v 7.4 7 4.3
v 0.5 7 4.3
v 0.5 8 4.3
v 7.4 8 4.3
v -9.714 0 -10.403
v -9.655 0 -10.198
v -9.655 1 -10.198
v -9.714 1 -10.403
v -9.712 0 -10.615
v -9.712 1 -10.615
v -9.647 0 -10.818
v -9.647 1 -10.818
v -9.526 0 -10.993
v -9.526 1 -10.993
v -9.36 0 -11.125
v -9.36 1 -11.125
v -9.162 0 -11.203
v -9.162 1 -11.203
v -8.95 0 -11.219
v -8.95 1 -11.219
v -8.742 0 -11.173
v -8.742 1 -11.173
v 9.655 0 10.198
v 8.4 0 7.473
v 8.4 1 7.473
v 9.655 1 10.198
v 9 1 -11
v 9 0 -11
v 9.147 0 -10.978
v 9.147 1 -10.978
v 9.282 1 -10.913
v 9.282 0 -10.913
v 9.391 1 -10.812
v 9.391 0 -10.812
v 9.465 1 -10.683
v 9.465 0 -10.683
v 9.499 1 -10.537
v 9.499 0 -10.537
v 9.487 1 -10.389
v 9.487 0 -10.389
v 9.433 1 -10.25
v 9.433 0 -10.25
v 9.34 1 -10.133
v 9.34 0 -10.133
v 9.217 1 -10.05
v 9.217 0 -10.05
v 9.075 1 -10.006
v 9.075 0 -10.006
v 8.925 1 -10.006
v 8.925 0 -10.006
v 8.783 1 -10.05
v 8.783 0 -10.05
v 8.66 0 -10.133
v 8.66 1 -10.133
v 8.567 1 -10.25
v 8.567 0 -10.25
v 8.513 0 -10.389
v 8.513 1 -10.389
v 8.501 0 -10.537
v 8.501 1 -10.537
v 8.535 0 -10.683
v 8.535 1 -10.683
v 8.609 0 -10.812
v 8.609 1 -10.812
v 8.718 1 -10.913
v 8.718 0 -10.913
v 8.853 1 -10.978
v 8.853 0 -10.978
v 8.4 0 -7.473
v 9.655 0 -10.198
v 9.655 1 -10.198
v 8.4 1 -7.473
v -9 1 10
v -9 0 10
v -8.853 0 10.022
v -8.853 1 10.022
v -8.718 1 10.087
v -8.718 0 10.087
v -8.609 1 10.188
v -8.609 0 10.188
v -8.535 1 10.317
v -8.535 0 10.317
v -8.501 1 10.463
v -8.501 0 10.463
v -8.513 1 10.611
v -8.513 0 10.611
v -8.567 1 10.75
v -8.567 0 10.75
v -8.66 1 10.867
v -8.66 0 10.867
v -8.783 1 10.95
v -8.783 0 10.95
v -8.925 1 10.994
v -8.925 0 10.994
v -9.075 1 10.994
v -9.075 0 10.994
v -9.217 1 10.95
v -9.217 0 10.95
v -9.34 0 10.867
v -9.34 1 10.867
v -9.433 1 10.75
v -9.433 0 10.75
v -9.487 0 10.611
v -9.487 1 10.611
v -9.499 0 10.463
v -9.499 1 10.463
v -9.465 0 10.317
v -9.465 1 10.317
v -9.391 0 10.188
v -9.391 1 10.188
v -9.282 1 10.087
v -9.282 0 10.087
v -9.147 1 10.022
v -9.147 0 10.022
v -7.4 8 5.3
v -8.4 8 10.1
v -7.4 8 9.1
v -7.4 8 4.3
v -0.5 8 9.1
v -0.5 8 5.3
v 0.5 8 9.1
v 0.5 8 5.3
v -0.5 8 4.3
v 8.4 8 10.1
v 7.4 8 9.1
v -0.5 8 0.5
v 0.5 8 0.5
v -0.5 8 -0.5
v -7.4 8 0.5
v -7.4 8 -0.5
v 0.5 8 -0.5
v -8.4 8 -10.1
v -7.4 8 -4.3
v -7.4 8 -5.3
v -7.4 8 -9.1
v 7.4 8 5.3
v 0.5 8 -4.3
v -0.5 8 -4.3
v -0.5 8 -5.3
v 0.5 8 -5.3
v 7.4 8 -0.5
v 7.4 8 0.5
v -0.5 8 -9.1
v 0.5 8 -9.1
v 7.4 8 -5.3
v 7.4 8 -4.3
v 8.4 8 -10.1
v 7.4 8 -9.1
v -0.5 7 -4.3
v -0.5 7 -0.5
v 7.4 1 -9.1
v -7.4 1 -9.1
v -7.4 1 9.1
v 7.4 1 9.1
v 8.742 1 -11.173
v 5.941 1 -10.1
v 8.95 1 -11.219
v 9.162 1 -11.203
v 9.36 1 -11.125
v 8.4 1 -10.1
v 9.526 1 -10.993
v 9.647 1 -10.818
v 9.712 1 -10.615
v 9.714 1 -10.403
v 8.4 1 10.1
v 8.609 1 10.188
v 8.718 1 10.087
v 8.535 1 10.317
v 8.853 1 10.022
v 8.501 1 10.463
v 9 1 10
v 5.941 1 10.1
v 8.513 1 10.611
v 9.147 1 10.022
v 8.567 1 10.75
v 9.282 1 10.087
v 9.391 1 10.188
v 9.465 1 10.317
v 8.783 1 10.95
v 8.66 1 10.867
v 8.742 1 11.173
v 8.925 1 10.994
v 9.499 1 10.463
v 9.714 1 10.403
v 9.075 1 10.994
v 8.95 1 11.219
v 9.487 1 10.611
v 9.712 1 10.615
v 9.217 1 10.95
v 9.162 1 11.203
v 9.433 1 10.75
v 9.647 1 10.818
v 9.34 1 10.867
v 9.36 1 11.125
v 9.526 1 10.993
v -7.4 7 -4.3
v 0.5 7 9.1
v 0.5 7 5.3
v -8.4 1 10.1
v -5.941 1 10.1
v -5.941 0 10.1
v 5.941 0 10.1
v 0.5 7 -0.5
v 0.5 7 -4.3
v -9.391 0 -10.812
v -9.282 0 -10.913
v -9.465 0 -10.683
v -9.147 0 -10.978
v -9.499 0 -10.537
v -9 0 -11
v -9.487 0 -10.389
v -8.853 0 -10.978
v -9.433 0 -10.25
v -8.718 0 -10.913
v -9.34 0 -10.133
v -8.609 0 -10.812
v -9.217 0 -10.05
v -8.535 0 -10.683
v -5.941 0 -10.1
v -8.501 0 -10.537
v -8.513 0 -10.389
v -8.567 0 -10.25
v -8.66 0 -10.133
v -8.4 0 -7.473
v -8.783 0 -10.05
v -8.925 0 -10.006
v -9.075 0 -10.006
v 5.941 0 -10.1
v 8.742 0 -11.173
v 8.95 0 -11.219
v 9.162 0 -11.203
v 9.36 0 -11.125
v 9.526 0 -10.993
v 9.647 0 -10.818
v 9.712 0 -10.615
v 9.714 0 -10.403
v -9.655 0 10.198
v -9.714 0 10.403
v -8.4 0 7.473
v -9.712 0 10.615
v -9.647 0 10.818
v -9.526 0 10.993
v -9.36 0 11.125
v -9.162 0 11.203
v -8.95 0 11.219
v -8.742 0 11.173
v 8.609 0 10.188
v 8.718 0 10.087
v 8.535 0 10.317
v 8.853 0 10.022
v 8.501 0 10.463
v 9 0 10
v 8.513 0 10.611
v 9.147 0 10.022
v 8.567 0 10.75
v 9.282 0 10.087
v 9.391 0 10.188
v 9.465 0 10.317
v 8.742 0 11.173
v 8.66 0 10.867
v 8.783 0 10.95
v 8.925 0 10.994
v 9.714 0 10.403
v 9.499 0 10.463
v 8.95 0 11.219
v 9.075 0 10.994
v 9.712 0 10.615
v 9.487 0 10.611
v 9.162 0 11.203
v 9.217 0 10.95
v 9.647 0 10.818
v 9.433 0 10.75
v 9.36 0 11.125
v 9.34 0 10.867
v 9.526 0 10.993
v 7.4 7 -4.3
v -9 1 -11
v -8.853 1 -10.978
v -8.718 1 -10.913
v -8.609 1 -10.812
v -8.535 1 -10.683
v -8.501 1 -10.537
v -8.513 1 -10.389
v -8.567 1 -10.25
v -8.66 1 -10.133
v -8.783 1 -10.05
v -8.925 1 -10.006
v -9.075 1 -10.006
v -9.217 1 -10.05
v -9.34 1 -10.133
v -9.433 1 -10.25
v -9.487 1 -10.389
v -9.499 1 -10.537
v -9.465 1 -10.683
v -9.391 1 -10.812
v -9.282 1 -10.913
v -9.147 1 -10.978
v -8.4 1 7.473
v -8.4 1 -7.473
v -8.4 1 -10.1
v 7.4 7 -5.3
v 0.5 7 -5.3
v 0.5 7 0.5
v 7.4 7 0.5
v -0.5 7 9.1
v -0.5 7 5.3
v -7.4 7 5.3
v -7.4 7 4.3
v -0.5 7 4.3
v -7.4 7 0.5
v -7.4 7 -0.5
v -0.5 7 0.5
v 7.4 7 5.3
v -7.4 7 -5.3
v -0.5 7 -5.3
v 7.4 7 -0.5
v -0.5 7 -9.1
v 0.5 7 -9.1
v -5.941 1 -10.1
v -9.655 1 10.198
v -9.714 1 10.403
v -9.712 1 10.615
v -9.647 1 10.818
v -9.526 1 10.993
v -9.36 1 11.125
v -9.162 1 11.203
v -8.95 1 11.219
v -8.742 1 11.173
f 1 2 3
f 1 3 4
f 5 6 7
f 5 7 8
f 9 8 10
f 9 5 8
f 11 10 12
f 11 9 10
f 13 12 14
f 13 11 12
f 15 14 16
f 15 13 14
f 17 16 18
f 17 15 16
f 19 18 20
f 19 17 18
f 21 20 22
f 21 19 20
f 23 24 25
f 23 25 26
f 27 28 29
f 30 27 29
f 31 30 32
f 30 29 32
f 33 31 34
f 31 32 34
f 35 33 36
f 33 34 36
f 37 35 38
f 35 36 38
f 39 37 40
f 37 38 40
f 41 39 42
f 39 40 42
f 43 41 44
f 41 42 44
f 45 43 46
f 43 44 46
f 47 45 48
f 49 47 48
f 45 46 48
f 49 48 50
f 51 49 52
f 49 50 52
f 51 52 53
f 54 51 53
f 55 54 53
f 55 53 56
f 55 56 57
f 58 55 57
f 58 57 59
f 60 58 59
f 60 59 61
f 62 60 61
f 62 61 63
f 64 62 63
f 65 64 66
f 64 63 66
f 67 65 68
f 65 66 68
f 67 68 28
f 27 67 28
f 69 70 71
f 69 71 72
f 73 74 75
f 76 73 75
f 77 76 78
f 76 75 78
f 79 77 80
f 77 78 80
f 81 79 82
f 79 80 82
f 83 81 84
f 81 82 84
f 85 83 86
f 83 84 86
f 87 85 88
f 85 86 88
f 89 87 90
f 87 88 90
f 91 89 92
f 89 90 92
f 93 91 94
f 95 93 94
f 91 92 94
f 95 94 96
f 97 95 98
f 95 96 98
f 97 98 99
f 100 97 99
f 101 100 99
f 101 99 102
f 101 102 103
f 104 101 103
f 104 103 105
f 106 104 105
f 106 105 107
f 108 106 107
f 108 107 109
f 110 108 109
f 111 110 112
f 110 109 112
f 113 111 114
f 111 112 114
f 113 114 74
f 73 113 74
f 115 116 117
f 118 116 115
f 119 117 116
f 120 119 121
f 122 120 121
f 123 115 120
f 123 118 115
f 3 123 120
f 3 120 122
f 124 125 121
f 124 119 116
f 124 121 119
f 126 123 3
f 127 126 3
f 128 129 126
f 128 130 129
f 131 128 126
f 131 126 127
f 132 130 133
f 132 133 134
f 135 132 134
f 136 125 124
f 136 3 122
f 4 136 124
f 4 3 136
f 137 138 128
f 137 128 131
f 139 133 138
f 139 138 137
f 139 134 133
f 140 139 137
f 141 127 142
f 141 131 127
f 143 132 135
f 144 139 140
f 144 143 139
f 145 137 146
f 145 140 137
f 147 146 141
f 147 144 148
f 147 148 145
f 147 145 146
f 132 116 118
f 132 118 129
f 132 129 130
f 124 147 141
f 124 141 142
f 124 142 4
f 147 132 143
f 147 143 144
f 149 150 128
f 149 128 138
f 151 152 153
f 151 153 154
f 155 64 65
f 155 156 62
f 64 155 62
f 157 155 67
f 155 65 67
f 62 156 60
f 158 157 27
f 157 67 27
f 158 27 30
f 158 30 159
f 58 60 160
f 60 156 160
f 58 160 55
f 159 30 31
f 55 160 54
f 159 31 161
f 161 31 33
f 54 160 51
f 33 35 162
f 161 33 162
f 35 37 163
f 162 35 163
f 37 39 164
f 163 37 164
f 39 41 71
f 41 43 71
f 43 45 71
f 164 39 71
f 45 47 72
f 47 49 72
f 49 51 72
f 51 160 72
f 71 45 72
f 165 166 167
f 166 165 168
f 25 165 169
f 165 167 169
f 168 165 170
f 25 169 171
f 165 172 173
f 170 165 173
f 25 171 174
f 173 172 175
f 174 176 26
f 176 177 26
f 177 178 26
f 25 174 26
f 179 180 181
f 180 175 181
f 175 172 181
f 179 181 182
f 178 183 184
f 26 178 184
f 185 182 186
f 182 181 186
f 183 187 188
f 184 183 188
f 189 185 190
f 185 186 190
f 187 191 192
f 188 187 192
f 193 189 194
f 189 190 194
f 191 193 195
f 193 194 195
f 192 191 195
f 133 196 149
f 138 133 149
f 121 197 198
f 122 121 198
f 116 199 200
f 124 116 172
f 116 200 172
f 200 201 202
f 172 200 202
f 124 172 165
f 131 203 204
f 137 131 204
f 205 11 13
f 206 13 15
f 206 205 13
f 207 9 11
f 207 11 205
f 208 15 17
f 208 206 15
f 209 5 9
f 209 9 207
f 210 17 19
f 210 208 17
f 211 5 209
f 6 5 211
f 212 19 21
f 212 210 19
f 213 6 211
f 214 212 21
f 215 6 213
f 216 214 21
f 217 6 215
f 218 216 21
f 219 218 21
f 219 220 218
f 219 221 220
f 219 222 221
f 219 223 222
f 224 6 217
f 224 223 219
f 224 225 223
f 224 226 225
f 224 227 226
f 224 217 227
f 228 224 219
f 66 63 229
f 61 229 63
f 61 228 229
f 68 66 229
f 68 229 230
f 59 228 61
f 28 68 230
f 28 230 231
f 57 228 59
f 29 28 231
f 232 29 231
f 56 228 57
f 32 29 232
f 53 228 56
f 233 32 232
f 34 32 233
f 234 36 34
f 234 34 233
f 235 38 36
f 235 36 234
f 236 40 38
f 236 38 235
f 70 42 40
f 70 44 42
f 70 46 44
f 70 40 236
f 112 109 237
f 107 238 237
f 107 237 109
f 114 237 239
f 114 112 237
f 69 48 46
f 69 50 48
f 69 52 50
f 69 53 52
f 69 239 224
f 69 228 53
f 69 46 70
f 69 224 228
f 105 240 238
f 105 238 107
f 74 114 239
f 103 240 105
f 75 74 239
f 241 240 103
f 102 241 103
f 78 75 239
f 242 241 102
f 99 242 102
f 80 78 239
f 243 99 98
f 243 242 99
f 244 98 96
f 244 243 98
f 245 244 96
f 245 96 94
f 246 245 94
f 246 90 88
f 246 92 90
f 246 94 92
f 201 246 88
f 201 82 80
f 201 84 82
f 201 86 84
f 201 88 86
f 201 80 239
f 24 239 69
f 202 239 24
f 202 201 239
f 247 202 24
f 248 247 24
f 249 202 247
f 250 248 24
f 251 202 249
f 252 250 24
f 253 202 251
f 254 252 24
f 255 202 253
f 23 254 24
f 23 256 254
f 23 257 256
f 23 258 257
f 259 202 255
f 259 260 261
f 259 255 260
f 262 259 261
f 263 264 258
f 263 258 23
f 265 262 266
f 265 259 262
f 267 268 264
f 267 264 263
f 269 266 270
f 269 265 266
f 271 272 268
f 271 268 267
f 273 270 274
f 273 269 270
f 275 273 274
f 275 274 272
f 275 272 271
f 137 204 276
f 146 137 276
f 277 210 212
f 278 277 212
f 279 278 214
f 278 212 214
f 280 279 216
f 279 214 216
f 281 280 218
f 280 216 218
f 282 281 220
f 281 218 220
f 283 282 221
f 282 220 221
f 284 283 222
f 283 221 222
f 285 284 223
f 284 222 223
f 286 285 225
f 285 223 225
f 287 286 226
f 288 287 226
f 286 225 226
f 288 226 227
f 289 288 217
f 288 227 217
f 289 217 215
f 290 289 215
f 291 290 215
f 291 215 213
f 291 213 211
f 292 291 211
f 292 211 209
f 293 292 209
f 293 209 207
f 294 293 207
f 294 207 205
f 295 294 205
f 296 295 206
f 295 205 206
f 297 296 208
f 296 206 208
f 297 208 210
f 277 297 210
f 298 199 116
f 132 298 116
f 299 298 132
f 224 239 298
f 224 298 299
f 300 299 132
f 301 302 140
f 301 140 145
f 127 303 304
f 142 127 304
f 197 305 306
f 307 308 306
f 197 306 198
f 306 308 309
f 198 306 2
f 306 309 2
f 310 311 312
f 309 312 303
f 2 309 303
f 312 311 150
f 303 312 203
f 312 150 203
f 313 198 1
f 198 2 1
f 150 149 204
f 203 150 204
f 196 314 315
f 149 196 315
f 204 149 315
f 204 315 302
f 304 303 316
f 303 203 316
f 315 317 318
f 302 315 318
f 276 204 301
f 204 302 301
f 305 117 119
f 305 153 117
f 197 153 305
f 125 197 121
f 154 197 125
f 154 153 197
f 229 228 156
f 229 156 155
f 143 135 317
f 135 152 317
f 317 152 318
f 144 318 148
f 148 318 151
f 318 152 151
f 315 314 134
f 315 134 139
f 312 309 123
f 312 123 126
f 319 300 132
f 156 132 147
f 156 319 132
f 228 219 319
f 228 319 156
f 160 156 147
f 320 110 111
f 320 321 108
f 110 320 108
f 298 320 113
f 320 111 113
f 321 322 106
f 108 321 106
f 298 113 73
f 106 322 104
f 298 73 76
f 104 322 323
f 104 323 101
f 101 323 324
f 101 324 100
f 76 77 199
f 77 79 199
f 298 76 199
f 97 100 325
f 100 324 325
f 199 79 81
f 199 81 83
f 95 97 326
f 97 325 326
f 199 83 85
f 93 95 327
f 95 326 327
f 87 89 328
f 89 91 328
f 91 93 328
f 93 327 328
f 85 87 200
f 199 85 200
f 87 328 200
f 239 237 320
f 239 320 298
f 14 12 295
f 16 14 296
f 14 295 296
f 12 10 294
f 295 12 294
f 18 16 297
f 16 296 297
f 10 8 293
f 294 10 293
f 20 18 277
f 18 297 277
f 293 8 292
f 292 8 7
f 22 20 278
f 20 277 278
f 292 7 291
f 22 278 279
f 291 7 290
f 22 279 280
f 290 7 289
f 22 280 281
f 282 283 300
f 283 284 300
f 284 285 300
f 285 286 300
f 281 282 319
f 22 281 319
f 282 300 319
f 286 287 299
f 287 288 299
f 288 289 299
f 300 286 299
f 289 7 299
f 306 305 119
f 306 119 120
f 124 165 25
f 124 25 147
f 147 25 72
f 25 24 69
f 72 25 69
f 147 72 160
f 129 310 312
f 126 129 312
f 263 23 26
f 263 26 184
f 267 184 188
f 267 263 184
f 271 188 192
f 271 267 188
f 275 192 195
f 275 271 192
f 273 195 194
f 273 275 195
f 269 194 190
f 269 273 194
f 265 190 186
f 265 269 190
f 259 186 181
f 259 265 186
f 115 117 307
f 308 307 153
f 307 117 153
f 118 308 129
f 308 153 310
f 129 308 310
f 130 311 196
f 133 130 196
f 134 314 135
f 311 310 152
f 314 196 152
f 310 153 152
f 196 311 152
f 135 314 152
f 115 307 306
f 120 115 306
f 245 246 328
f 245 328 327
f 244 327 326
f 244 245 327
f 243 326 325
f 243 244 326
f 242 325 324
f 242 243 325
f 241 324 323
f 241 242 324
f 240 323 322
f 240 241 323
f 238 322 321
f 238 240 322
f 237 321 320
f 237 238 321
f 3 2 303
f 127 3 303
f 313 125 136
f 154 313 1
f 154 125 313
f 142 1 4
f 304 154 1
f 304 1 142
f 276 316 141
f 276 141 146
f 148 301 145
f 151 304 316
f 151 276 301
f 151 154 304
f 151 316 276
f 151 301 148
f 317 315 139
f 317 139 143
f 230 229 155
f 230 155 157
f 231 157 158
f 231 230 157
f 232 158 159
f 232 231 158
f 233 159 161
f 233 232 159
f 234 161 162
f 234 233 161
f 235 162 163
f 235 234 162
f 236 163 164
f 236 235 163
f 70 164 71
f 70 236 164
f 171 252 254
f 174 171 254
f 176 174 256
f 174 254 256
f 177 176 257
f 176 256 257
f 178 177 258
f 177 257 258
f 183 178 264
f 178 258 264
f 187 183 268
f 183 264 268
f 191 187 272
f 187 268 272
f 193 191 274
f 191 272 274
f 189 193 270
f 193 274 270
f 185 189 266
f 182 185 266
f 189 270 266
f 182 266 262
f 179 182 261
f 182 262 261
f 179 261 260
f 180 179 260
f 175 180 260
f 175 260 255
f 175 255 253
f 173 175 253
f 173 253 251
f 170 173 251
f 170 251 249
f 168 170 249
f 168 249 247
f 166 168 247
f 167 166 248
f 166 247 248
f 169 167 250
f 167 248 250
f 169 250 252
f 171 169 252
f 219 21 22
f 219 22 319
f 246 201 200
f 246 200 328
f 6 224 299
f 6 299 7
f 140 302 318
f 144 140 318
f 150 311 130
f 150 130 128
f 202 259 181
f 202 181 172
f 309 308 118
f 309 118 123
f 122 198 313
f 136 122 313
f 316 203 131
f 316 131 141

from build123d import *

# Parameters (mm, degrees)
SKETCH1_W           = 16.8
SKETCH1_H           = 20.2
SKETCH1_W_2         = 6.9
SKETCH1_H_2         = 3.8
BOSS_EXTRUDE1_DEPTH = 1
SKETCH2_W           = 16.8
SKETCH2_H           = 20.2
SKETCH2_W_2         = 6.9
SKETCH2_H_2         = 3.8
BOSS_EXTRUDE2_DEPTH = 1
SKETCH4_W           = 16.8
SKETCH4_H           = 20.2
SKETCH4_W_2         = 14.8
SKETCH4_H_2         = 18.2
BOSS_EXTRUDE3_DEPTH = 6
SKETCH5_R           = 0.5
BOSS_EXTRUDE4_DEPTH = 1


with BuildPart() as part:
    # Sketch1 → Boss-Extrude1 (new body)
    # profile 1 of 9: a face of its own
    with BuildSketch(Plane(origin=(0, 0, 0), x_dir=(1, 0, 0), z_dir=(0, 1, 0))):
        Rectangle(SKETCH1_W, SKETCH1_H)
        with Locations((3.95, 7.2)):
            Rectangle(SKETCH1_W_2, SKETCH1_H_2, mode=Mode.SUBTRACT)
        with Locations((3.95, 2.4)):
            Rectangle(SKETCH1_W_2, SKETCH1_H_2, mode=Mode.SUBTRACT)
        with Locations((-3.95, -2.4)):
            Rectangle(SKETCH1_W_2, SKETCH1_H_2, mode=Mode.SUBTRACT)
        with Locations((-3.95, -7.2)):
            Rectangle(SKETCH1_W_2, SKETCH1_H_2, mode=Mode.SUBTRACT)
        with Locations((3.95, -7.2)):
            Rectangle(SKETCH1_W_2, SKETCH1_H_2, mode=Mode.SUBTRACT)
        with Locations((3.95, -2.4)):
            Rectangle(SKETCH1_W_2, SKETCH1_H_2, mode=Mode.SUBTRACT)
        with Locations((-3.95, 7.2)):
            Rectangle(SKETCH1_W_2, SKETCH1_H_2, mode=Mode.SUBTRACT)
        with Locations((-3.95, 2.4)):
            Rectangle(SKETCH1_W_2, SKETCH1_H_2, mode=Mode.SUBTRACT)
    # profile 2 of 9: a face of its own
    with BuildSketch(Plane(origin=(0, 0, 0), x_dir=(1, 0, 0), z_dir=(0, 1, 0))):
        with Locations((-3.95, 2.4)):
            Rectangle(SKETCH1_W_2, SKETCH1_H_2)
    # profile 3 of 9: a face of its own
    with BuildSketch(Plane(origin=(0, 0, 0), x_dir=(1, 0, 0), z_dir=(0, 1, 0))):
        with Locations((-3.95, 7.2)):
            Rectangle(SKETCH1_W_2, SKETCH1_H_2)
    # profile 4 of 9: a face of its own
    with BuildSketch(Plane(origin=(0, 0, 0), x_dir=(1, 0, 0), z_dir=(0, 1, 0))):
        with Locations((3.95, 7.2)):
            Rectangle(SKETCH1_W_2, SKETCH1_H_2)
    # profile 5 of 9: a face of its own
    with BuildSketch(Plane(origin=(0, 0, 0), x_dir=(1, 0, 0), z_dir=(0, 1, 0))):
        with Locations((3.95, 2.4)):
            Rectangle(SKETCH1_W_2, SKETCH1_H_2)
    # profile 6 of 9: a face of its own
    with BuildSketch(Plane(origin=(0, 0, 0), x_dir=(1, 0, 0), z_dir=(0, 1, 0))):
        with Locations((3.95, -2.4)):
            Rectangle(SKETCH1_W_2, SKETCH1_H_2)
    # profile 7 of 9: a face of its own
    with BuildSketch(Plane(origin=(0, 0, 0), x_dir=(1, 0, 0), z_dir=(0, 1, 0))):
        with Locations((-3.95, -2.4)):
            Rectangle(SKETCH1_W_2, SKETCH1_H_2)
    # profile 8 of 9: a face of its own
    with BuildSketch(Plane(origin=(0, 0, 0), x_dir=(1, 0, 0), z_dir=(0, 1, 0))):
        with Locations((-3.95, -7.2)):
            Rectangle(SKETCH1_W_2, SKETCH1_H_2)
    # profile 9 of 9: a face of its own
    with BuildSketch(Plane(origin=(0, 0, 0), x_dir=(1, 0, 0), z_dir=(0, 1, 0))):
        with Locations((3.95, -7.2)):
            Rectangle(SKETCH1_W_2, SKETCH1_H_2)
    extrude(amount=BOSS_EXTRUDE1_DEPTH)



with BuildPart() as body_2:
    # Sketch2 → Boss-Extrude2 (new body)
    with BuildSketch(Plane(origin=(0, 7, 0), x_dir=(1, 0, 0), z_dir=(0, 1, 0))):
        Rectangle(SKETCH2_W, SKETCH2_H)
        with Locations((-3.95, -7.2)):
            Rectangle(SKETCH2_W_2, SKETCH2_H_2, mode=Mode.SUBTRACT)
        with Locations((3.95, -7.2)):
            Rectangle(SKETCH2_W_2, SKETCH2_H_2, mode=Mode.SUBTRACT)
        with Locations((3.95, -2.4)):
            Rectangle(SKETCH2_W_2, SKETCH2_H_2, mode=Mode.SUBTRACT)
        with Locations((-3.95, -2.4)):
            Rectangle(SKETCH2_W_2, SKETCH2_H_2, mode=Mode.SUBTRACT)
        with Locations((-3.95, 2.4)):
            Rectangle(SKETCH2_W_2, SKETCH2_H_2, mode=Mode.SUBTRACT)
        with Locations((3.95, 2.4)):
            Rectangle(SKETCH2_W_2, SKETCH2_H_2, mode=Mode.SUBTRACT)
        with Locations((3.95, 7.2)):
            Rectangle(SKETCH2_W_2, SKETCH2_H_2, mode=Mode.SUBTRACT)
        with Locations((-3.95, 7.2)):
            Rectangle(SKETCH2_W_2, SKETCH2_H_2, mode=Mode.SUBTRACT)
    extrude(amount=BOSS_EXTRUDE2_DEPTH)


with BuildPart() as part_1:
    add(part.part)

    add(body_2.part)  # Boss-Extrude3 merges body 2
    # Sketch4 → Boss-Extrude3 (add)
    with BuildSketch(Plane(origin=(0, 1, 0), x_dir=(1, 0, 0), z_dir=(0, 1, 0))):
        Rectangle(SKETCH4_W, SKETCH4_H)
        Rectangle(SKETCH4_W_2, SKETCH4_H_2, mode=Mode.SUBTRACT)
    extrude(amount=BOSS_EXTRUDE3_DEPTH)

    # Sketch5 → Boss-Extrude4 (add)
    # profile 1 of 4: a face of its own
    with BuildSketch(Plane.XZ):
        with BuildLine():
            Line((8.4, 7.47345081), (9.654981825, 10.198339912))
            ThreePointArc((9.654981825, 10.198339912), (9.526374462, 10.99287922), (8.741993026, 11.173373894))
            Line((8.741993026, 11.173373894), (5.940588292, 10.1))
            Line((5.940588292, 10.1), (8.4, 10.1))
            Line((8.4, 10.1), (8.4, 7.47345081))
        make_face()
        with Locations(Location((9, 10.5, 0), (0, 0, 270))):
            Circle(SKETCH5_R, mode=Mode.SUBTRACT)
    # profile 2 of 4: a face of its own
    with BuildSketch(Plane.XZ):
        with BuildLine():
            Line((9.654981825, -10.198339912), (8.4, -7.47345081))
            Line((8.4, -7.47345081), (8.4, -10.1))
            Line((8.4, -10.1), (5.940588292, -10.1))
            Line((5.940588292, -10.1), (8.741993026, -11.173373894))
            ThreePointArc((8.741993026, -11.173373894), (9.526374462, -10.99287922), (9.654981825, -10.198339912))
        make_face()
        with Locations(Location((9, -10.5, 0), (0, 0, 270))):
            Circle(SKETCH5_R, mode=Mode.SUBTRACT)
    # profile 3 of 4: a face of its own
    with BuildSketch(Plane.XZ):
        with BuildLine():
            Line((-8.4, 10.1), (-5.940588292, 10.1))
            Line((-5.940588292, 10.1), (-8.741993026, 11.173373894))
            ThreePointArc((-8.741993026, 11.173373894), (-9.526374462, 10.99287922), (-9.654981825, 10.198339912))
            Line((-9.654981825, 10.198339912), (-8.4, 7.47345081))
            Line((-8.4, 7.47345081), (-8.4, 10.1))
        make_face()
        with Locations(Location((-9, 10.5, 0), (0, 0, 270))):
            Circle(SKETCH5_R, mode=Mode.SUBTRACT)
    # profile 4 of 4: a face of its own
    with BuildSketch(Plane.XZ):
        with BuildLine():
            Line((-8.741993026, -11.173373894), (-5.940588292, -10.1))
            Line((-5.940588292, -10.1), (-8.4, -10.1))
            Line((-8.4, -10.1), (-8.4, -7.47345081))
            Line((-8.4, -7.47345081), (-9.654981825, -10.198339912))
            ThreePointArc((-9.654981825, -10.198339912), (-9.526374462, -10.99287922), (-8.741993026, -11.173373894))
        make_face()
        with Locations(Location((-9, -10.5, 0), (0, 0, 270))):
            Circle(SKETCH5_R, mode=Mode.SUBTRACT)
    extrude(amount=-BOSS_EXTRUDE4_DEPTH)


solid = part_1.part
